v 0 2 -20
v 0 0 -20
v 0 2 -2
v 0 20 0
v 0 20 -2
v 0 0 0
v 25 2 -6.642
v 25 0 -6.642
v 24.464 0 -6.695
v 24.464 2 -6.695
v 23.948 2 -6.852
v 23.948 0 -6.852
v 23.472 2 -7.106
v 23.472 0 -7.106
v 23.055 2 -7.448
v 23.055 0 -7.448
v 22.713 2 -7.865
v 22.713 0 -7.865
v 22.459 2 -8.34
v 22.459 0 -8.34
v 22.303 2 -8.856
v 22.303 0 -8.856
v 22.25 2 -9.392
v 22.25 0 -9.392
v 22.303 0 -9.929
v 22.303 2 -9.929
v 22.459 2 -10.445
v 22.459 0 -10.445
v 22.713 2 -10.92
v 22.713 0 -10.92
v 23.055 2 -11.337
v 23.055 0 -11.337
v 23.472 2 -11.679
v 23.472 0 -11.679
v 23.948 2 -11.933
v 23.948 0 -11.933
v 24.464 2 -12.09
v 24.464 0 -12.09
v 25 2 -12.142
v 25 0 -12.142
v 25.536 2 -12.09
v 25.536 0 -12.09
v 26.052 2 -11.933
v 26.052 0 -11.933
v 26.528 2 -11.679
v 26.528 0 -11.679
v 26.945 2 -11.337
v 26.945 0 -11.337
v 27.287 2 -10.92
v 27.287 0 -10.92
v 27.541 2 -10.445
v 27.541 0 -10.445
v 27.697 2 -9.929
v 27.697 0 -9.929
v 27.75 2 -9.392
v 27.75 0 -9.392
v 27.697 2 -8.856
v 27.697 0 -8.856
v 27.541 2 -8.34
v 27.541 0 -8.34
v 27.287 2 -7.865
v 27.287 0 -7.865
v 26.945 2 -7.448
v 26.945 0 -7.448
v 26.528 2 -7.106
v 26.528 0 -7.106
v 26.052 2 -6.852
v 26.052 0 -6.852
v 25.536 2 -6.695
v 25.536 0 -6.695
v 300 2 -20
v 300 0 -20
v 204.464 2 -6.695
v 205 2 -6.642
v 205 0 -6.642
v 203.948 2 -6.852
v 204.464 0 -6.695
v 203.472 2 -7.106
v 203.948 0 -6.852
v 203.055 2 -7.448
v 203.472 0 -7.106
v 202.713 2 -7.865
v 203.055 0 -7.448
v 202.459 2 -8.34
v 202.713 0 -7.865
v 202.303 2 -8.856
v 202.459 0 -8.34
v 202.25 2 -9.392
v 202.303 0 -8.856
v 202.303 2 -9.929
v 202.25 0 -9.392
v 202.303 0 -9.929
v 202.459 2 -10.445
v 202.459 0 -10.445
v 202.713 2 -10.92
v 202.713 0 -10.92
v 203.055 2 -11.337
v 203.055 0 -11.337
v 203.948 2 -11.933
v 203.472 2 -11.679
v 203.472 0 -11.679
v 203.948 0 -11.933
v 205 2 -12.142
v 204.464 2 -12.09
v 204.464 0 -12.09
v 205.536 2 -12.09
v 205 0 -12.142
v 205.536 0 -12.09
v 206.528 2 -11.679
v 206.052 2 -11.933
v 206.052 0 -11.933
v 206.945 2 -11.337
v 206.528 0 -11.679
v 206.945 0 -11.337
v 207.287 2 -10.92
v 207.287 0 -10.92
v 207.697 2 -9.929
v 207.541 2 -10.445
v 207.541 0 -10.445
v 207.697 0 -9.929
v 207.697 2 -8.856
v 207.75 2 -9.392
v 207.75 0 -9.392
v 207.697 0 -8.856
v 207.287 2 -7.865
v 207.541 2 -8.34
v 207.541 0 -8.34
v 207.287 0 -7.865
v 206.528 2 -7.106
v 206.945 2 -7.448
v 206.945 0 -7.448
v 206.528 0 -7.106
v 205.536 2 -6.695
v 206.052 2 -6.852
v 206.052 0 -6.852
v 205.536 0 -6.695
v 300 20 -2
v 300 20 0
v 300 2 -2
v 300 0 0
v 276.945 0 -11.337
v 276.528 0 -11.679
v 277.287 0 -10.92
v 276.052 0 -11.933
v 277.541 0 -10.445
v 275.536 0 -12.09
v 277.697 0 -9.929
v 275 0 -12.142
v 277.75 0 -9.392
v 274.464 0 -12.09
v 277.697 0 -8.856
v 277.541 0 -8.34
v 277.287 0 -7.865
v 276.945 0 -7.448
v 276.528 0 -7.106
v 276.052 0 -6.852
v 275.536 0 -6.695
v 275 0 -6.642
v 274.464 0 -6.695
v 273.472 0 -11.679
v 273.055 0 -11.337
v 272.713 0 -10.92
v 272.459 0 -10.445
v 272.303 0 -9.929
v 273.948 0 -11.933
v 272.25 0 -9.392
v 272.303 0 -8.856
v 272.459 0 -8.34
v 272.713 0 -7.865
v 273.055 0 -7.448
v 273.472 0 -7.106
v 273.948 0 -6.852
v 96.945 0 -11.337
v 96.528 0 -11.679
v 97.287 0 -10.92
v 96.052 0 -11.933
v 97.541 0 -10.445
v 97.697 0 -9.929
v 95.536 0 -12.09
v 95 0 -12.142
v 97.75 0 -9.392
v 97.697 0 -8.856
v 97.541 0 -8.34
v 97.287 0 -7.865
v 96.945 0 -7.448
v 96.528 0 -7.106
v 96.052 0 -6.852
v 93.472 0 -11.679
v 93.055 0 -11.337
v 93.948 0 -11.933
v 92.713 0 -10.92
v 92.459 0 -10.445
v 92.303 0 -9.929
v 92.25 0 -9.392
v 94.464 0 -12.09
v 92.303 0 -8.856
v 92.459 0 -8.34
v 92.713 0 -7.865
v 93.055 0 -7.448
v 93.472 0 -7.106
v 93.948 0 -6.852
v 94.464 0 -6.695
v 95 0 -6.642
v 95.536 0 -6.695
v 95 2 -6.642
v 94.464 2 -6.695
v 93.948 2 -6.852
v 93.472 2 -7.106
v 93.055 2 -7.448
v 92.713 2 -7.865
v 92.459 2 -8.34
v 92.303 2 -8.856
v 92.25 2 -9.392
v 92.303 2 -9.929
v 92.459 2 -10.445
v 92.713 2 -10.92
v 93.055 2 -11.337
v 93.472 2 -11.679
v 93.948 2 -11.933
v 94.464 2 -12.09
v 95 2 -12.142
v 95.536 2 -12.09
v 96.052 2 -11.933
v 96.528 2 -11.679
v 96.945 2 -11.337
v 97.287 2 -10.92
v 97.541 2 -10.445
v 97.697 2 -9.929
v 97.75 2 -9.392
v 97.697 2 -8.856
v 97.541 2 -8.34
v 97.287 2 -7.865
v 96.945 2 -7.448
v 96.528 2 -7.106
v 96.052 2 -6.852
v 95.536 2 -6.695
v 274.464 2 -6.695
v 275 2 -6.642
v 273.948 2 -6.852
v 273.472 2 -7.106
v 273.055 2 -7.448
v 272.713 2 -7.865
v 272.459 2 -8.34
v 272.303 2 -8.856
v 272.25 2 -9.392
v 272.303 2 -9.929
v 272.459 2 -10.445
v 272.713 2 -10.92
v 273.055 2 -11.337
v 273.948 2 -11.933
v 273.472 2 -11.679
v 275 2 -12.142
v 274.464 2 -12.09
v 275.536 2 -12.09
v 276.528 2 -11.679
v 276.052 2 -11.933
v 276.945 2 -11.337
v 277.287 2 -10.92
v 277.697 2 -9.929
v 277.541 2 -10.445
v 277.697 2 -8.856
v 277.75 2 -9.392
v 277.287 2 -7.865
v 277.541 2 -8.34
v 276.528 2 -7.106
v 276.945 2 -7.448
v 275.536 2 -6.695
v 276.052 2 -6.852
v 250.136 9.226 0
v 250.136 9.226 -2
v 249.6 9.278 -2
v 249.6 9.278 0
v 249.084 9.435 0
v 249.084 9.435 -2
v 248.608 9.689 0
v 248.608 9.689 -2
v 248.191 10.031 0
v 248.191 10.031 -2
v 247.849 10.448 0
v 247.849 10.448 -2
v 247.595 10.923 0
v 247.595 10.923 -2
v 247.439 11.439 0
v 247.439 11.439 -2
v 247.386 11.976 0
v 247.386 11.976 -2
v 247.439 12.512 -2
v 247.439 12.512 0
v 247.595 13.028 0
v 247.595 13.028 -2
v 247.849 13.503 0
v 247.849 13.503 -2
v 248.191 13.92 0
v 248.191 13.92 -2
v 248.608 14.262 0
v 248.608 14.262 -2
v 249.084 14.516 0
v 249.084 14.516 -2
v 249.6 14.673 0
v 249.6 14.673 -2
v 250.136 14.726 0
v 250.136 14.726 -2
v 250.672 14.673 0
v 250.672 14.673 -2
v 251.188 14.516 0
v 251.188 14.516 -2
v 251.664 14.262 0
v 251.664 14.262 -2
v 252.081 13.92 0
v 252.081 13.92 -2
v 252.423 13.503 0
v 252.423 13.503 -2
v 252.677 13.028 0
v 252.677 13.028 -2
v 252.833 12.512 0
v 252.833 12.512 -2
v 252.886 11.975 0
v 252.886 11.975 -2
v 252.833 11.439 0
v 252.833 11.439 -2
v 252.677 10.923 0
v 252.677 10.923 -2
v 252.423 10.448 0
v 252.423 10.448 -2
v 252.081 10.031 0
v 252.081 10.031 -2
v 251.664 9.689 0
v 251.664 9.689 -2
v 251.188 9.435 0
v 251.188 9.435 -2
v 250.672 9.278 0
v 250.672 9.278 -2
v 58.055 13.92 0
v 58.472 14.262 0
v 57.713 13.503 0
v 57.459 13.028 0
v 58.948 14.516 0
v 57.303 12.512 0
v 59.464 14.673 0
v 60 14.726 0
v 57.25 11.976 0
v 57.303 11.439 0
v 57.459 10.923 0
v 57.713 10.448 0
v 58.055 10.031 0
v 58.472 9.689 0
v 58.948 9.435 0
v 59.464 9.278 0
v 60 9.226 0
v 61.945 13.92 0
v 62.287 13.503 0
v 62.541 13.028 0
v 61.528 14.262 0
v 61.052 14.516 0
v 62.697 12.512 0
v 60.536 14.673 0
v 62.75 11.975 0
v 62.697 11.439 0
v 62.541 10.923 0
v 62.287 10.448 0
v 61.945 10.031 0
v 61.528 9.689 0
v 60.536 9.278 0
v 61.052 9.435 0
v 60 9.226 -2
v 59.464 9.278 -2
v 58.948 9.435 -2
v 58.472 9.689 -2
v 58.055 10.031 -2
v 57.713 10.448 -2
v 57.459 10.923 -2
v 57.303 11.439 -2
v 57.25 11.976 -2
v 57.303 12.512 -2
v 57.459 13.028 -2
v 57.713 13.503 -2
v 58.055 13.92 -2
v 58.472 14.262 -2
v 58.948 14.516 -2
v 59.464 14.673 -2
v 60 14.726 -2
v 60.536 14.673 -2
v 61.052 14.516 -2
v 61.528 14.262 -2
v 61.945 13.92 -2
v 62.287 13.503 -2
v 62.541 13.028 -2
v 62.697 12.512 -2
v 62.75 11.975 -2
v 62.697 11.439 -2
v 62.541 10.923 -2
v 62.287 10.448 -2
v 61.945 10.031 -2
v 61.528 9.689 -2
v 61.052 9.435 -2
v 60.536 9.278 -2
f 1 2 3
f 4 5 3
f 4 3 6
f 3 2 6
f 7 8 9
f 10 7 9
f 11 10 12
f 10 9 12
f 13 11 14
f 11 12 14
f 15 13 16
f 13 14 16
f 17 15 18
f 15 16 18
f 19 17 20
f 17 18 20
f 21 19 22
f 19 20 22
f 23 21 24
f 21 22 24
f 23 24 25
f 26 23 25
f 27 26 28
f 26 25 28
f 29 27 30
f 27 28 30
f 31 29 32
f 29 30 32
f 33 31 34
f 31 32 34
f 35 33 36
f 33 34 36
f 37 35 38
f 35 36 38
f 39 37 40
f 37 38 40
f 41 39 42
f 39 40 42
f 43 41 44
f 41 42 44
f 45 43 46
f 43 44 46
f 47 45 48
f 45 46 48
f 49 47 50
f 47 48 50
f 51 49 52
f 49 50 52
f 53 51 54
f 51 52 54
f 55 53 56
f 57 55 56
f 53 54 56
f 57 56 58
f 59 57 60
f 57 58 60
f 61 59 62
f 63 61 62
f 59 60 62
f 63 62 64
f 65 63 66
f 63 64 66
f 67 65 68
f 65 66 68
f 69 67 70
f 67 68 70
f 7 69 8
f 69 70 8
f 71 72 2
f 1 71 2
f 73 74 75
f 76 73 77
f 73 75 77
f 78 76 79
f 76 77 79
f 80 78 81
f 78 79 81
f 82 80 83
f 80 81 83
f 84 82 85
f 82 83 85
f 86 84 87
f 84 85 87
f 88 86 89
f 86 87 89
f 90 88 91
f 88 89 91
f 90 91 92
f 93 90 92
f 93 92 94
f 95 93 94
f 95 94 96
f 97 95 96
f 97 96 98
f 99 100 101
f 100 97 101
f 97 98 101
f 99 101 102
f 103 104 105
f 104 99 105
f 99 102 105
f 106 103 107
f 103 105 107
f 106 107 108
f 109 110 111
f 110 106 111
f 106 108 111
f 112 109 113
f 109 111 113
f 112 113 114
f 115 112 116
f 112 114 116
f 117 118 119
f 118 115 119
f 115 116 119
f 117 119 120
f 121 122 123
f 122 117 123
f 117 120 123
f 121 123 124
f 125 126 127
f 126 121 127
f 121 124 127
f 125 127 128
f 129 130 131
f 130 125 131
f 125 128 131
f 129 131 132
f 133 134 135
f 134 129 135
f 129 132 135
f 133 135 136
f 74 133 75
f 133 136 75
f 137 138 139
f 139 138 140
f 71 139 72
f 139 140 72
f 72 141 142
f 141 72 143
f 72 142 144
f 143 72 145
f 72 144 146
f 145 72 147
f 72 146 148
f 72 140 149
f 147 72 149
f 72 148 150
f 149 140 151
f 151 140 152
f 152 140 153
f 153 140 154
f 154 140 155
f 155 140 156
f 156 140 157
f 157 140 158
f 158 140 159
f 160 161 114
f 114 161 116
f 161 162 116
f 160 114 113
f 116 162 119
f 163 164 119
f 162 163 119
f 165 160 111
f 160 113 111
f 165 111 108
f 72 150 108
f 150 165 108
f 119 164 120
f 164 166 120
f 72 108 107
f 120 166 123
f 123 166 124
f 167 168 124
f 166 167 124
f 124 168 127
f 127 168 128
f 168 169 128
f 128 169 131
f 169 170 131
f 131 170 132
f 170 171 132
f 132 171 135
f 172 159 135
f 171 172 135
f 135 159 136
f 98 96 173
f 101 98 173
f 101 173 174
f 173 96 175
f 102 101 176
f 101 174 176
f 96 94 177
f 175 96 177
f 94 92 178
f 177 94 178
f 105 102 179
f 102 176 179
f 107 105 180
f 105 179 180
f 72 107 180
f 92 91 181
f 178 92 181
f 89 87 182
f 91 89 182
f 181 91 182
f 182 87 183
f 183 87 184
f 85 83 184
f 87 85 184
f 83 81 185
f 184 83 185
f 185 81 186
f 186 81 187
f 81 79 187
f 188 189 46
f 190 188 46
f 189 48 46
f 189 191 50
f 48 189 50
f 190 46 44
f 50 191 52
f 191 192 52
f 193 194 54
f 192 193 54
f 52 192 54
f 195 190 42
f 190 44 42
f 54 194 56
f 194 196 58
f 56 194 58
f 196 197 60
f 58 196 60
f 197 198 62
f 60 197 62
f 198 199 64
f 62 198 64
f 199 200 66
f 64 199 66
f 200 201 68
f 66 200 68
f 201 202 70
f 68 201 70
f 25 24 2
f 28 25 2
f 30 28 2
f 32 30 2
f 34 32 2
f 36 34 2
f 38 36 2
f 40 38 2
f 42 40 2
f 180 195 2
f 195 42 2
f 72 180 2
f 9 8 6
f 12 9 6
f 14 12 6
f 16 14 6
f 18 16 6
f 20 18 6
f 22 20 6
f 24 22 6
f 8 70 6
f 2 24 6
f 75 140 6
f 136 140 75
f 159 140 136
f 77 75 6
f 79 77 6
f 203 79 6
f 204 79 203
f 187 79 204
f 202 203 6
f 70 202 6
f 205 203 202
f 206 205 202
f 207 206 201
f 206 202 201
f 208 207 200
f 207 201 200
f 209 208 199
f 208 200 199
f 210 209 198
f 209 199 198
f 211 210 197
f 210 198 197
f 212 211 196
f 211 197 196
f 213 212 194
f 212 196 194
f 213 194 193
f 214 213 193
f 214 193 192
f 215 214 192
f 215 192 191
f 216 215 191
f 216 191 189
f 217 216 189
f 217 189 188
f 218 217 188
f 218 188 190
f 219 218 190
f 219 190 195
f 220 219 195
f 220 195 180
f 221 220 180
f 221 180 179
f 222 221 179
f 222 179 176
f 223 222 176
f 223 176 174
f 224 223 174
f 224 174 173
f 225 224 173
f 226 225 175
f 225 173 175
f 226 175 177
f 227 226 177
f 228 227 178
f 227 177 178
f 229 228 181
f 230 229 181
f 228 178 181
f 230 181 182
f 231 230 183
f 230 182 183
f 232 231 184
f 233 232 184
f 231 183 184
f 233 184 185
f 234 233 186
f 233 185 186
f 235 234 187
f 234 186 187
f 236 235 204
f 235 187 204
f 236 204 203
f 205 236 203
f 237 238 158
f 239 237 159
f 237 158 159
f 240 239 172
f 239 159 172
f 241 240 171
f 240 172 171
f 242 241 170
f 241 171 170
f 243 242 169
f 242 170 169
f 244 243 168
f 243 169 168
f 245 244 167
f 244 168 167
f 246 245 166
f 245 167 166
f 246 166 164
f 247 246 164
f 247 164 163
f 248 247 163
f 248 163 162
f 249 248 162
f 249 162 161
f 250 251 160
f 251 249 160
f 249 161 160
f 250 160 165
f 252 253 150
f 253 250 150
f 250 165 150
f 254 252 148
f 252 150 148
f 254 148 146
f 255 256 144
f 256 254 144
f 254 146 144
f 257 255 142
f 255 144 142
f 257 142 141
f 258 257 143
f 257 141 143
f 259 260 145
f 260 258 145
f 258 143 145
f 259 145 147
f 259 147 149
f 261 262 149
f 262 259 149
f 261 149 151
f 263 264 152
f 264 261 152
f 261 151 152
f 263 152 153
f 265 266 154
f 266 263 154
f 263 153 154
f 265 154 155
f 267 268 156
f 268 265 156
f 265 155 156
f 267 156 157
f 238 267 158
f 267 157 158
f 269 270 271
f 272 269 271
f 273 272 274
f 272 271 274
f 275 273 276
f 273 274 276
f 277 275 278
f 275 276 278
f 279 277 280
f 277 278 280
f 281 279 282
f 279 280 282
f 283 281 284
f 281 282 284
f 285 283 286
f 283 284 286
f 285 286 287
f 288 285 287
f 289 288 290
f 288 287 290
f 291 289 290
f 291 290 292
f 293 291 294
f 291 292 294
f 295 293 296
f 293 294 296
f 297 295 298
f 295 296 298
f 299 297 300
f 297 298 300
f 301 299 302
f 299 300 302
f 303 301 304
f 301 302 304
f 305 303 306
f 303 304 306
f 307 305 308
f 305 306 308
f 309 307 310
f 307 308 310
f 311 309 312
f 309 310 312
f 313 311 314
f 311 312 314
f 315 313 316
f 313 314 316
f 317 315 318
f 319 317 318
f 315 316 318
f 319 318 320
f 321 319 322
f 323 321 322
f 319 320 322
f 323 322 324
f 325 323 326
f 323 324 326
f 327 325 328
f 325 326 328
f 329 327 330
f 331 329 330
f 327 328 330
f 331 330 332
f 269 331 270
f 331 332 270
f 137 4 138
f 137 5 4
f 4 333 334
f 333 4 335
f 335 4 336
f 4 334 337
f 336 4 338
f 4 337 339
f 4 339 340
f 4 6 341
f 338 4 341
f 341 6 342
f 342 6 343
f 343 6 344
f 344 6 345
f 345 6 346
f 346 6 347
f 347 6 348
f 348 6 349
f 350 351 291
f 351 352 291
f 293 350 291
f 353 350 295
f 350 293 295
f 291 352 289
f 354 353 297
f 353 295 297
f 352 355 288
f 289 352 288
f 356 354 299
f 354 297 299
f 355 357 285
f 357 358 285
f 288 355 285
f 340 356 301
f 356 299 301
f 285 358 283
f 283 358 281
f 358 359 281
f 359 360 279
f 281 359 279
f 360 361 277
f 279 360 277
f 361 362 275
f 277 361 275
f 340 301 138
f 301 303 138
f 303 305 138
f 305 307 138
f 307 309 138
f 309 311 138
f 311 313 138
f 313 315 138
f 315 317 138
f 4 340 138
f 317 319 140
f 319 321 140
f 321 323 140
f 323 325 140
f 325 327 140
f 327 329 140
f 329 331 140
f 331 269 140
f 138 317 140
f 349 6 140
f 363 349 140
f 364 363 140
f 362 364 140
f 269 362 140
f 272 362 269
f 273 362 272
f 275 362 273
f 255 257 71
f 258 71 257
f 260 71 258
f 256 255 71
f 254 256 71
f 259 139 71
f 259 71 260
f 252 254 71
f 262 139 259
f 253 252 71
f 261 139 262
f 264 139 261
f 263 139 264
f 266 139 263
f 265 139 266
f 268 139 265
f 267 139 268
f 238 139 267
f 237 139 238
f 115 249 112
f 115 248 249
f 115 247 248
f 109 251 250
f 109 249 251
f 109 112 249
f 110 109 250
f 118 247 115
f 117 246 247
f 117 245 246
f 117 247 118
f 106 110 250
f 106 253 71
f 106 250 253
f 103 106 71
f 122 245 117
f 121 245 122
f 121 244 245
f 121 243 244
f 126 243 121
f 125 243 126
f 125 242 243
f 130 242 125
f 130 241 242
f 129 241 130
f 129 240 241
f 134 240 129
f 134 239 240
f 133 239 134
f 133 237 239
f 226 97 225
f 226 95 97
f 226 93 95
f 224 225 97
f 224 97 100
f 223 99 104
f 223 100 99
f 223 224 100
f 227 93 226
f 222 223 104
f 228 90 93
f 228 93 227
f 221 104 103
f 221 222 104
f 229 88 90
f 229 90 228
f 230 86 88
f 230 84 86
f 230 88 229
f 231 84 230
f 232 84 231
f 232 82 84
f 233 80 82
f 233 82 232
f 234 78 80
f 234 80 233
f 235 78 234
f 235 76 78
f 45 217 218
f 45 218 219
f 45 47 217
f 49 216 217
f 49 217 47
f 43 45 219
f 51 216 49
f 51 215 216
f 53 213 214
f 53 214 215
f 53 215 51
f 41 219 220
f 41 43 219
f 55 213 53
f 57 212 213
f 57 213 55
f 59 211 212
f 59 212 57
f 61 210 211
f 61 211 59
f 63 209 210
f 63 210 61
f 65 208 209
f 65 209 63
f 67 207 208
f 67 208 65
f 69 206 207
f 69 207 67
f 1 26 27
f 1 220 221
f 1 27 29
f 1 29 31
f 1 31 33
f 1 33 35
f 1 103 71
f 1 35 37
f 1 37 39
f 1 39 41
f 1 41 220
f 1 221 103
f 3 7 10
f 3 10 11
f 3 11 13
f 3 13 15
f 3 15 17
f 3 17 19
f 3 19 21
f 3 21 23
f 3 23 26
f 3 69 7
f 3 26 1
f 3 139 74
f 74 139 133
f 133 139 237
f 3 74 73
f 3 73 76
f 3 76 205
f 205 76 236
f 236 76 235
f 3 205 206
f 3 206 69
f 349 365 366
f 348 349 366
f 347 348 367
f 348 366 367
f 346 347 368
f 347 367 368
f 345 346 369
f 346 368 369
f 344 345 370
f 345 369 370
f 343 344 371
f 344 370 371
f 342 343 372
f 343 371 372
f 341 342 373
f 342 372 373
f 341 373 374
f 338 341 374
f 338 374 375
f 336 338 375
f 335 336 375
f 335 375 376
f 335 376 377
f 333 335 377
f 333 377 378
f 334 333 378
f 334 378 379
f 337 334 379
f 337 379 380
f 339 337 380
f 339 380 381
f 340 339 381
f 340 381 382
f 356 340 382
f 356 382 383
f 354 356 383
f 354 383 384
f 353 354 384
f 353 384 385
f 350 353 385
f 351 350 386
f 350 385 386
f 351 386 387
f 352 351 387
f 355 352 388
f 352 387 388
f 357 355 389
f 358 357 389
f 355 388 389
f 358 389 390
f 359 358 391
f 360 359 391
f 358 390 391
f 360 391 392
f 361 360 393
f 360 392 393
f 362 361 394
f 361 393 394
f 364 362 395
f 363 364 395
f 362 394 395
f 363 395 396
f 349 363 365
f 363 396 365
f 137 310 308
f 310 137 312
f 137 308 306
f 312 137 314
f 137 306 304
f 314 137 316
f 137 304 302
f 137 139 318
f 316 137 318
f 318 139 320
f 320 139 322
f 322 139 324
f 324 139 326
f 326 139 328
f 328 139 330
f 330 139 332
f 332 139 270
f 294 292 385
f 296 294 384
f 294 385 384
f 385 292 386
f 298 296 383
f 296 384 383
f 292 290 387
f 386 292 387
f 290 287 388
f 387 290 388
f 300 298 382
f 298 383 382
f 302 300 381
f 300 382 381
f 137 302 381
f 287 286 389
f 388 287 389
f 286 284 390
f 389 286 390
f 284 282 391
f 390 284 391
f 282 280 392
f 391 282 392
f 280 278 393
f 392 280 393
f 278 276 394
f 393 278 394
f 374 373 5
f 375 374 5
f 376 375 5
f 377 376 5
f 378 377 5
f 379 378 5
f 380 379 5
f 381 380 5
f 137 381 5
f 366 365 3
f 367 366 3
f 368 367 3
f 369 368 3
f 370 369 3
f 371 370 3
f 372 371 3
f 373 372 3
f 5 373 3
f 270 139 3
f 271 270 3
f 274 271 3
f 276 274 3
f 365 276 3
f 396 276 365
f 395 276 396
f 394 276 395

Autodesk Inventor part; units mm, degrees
ref_plane "XZ Plane" through (0, 0, 0) normal (0, 1, 0) x (-1, 0, 0)
ref_plane "XY Plane" through (0, 0, 0) normal (0, 0, 1) x (1, 0, 0)
sketch "Sketch1" plane through (0, 0, 0) normal (0, 1, 0) x (-1, 0, 0)
  line L0 (0, 0) -> (-300, 0)
  line L1 (-300, 0) -> (-300, -20)
  line L2 (-300, -20) -> (0, -20)
  line L3 (0, -20) -> (0, 0)
  dimension "d0" = 300
  dimension "d1" = 20
extrude "Extrusion1" add sketch "Sketch1" along normal blind 2
sketch "Sketch2" plane through (0, 2, 0) normal (0, 1, 0) x (1, 0, 0)
  line L0 (0, 0) -> (300, 0)
  line L1 (300, 0) -> (300, 2)
  line L2 (300, 2) -> (0, 2)
  line L3 (0, 2) -> (0, 0)
  dimension "d4" = 300
  dimension "d5" = 2
extrude "Extrusion2" add sketch "Sketch2" along normal blind 18
hole "Hole1" at (60, 11.9755, 0) direction (0, 0, -1) diameter 5.5 end through all
pattern_linear "Rectangular Pattern1" count 2 spacing 190.136 along (1, 0, 0) of "Hole1"
hole "Hole2" at (25, 2, -9.3924) direction (0, -1, 0) diameter 5.5 end through all
pattern_linear "Rectangular Pattern2" count 2 spacing 70 along (1, 0, 0) of "Hole2"
ref_plane "Work Plane1" through (150, 0, 0) normal (1, 0, 0) x (0, 1, 0)
mirror "Mirror1" about plane through (150, 0, 0) normal (1, 0, 0) of "Hole2", "Rectangular Pattern2"
properties part number "Lbarx1 small" material "Aluminum 6061"
